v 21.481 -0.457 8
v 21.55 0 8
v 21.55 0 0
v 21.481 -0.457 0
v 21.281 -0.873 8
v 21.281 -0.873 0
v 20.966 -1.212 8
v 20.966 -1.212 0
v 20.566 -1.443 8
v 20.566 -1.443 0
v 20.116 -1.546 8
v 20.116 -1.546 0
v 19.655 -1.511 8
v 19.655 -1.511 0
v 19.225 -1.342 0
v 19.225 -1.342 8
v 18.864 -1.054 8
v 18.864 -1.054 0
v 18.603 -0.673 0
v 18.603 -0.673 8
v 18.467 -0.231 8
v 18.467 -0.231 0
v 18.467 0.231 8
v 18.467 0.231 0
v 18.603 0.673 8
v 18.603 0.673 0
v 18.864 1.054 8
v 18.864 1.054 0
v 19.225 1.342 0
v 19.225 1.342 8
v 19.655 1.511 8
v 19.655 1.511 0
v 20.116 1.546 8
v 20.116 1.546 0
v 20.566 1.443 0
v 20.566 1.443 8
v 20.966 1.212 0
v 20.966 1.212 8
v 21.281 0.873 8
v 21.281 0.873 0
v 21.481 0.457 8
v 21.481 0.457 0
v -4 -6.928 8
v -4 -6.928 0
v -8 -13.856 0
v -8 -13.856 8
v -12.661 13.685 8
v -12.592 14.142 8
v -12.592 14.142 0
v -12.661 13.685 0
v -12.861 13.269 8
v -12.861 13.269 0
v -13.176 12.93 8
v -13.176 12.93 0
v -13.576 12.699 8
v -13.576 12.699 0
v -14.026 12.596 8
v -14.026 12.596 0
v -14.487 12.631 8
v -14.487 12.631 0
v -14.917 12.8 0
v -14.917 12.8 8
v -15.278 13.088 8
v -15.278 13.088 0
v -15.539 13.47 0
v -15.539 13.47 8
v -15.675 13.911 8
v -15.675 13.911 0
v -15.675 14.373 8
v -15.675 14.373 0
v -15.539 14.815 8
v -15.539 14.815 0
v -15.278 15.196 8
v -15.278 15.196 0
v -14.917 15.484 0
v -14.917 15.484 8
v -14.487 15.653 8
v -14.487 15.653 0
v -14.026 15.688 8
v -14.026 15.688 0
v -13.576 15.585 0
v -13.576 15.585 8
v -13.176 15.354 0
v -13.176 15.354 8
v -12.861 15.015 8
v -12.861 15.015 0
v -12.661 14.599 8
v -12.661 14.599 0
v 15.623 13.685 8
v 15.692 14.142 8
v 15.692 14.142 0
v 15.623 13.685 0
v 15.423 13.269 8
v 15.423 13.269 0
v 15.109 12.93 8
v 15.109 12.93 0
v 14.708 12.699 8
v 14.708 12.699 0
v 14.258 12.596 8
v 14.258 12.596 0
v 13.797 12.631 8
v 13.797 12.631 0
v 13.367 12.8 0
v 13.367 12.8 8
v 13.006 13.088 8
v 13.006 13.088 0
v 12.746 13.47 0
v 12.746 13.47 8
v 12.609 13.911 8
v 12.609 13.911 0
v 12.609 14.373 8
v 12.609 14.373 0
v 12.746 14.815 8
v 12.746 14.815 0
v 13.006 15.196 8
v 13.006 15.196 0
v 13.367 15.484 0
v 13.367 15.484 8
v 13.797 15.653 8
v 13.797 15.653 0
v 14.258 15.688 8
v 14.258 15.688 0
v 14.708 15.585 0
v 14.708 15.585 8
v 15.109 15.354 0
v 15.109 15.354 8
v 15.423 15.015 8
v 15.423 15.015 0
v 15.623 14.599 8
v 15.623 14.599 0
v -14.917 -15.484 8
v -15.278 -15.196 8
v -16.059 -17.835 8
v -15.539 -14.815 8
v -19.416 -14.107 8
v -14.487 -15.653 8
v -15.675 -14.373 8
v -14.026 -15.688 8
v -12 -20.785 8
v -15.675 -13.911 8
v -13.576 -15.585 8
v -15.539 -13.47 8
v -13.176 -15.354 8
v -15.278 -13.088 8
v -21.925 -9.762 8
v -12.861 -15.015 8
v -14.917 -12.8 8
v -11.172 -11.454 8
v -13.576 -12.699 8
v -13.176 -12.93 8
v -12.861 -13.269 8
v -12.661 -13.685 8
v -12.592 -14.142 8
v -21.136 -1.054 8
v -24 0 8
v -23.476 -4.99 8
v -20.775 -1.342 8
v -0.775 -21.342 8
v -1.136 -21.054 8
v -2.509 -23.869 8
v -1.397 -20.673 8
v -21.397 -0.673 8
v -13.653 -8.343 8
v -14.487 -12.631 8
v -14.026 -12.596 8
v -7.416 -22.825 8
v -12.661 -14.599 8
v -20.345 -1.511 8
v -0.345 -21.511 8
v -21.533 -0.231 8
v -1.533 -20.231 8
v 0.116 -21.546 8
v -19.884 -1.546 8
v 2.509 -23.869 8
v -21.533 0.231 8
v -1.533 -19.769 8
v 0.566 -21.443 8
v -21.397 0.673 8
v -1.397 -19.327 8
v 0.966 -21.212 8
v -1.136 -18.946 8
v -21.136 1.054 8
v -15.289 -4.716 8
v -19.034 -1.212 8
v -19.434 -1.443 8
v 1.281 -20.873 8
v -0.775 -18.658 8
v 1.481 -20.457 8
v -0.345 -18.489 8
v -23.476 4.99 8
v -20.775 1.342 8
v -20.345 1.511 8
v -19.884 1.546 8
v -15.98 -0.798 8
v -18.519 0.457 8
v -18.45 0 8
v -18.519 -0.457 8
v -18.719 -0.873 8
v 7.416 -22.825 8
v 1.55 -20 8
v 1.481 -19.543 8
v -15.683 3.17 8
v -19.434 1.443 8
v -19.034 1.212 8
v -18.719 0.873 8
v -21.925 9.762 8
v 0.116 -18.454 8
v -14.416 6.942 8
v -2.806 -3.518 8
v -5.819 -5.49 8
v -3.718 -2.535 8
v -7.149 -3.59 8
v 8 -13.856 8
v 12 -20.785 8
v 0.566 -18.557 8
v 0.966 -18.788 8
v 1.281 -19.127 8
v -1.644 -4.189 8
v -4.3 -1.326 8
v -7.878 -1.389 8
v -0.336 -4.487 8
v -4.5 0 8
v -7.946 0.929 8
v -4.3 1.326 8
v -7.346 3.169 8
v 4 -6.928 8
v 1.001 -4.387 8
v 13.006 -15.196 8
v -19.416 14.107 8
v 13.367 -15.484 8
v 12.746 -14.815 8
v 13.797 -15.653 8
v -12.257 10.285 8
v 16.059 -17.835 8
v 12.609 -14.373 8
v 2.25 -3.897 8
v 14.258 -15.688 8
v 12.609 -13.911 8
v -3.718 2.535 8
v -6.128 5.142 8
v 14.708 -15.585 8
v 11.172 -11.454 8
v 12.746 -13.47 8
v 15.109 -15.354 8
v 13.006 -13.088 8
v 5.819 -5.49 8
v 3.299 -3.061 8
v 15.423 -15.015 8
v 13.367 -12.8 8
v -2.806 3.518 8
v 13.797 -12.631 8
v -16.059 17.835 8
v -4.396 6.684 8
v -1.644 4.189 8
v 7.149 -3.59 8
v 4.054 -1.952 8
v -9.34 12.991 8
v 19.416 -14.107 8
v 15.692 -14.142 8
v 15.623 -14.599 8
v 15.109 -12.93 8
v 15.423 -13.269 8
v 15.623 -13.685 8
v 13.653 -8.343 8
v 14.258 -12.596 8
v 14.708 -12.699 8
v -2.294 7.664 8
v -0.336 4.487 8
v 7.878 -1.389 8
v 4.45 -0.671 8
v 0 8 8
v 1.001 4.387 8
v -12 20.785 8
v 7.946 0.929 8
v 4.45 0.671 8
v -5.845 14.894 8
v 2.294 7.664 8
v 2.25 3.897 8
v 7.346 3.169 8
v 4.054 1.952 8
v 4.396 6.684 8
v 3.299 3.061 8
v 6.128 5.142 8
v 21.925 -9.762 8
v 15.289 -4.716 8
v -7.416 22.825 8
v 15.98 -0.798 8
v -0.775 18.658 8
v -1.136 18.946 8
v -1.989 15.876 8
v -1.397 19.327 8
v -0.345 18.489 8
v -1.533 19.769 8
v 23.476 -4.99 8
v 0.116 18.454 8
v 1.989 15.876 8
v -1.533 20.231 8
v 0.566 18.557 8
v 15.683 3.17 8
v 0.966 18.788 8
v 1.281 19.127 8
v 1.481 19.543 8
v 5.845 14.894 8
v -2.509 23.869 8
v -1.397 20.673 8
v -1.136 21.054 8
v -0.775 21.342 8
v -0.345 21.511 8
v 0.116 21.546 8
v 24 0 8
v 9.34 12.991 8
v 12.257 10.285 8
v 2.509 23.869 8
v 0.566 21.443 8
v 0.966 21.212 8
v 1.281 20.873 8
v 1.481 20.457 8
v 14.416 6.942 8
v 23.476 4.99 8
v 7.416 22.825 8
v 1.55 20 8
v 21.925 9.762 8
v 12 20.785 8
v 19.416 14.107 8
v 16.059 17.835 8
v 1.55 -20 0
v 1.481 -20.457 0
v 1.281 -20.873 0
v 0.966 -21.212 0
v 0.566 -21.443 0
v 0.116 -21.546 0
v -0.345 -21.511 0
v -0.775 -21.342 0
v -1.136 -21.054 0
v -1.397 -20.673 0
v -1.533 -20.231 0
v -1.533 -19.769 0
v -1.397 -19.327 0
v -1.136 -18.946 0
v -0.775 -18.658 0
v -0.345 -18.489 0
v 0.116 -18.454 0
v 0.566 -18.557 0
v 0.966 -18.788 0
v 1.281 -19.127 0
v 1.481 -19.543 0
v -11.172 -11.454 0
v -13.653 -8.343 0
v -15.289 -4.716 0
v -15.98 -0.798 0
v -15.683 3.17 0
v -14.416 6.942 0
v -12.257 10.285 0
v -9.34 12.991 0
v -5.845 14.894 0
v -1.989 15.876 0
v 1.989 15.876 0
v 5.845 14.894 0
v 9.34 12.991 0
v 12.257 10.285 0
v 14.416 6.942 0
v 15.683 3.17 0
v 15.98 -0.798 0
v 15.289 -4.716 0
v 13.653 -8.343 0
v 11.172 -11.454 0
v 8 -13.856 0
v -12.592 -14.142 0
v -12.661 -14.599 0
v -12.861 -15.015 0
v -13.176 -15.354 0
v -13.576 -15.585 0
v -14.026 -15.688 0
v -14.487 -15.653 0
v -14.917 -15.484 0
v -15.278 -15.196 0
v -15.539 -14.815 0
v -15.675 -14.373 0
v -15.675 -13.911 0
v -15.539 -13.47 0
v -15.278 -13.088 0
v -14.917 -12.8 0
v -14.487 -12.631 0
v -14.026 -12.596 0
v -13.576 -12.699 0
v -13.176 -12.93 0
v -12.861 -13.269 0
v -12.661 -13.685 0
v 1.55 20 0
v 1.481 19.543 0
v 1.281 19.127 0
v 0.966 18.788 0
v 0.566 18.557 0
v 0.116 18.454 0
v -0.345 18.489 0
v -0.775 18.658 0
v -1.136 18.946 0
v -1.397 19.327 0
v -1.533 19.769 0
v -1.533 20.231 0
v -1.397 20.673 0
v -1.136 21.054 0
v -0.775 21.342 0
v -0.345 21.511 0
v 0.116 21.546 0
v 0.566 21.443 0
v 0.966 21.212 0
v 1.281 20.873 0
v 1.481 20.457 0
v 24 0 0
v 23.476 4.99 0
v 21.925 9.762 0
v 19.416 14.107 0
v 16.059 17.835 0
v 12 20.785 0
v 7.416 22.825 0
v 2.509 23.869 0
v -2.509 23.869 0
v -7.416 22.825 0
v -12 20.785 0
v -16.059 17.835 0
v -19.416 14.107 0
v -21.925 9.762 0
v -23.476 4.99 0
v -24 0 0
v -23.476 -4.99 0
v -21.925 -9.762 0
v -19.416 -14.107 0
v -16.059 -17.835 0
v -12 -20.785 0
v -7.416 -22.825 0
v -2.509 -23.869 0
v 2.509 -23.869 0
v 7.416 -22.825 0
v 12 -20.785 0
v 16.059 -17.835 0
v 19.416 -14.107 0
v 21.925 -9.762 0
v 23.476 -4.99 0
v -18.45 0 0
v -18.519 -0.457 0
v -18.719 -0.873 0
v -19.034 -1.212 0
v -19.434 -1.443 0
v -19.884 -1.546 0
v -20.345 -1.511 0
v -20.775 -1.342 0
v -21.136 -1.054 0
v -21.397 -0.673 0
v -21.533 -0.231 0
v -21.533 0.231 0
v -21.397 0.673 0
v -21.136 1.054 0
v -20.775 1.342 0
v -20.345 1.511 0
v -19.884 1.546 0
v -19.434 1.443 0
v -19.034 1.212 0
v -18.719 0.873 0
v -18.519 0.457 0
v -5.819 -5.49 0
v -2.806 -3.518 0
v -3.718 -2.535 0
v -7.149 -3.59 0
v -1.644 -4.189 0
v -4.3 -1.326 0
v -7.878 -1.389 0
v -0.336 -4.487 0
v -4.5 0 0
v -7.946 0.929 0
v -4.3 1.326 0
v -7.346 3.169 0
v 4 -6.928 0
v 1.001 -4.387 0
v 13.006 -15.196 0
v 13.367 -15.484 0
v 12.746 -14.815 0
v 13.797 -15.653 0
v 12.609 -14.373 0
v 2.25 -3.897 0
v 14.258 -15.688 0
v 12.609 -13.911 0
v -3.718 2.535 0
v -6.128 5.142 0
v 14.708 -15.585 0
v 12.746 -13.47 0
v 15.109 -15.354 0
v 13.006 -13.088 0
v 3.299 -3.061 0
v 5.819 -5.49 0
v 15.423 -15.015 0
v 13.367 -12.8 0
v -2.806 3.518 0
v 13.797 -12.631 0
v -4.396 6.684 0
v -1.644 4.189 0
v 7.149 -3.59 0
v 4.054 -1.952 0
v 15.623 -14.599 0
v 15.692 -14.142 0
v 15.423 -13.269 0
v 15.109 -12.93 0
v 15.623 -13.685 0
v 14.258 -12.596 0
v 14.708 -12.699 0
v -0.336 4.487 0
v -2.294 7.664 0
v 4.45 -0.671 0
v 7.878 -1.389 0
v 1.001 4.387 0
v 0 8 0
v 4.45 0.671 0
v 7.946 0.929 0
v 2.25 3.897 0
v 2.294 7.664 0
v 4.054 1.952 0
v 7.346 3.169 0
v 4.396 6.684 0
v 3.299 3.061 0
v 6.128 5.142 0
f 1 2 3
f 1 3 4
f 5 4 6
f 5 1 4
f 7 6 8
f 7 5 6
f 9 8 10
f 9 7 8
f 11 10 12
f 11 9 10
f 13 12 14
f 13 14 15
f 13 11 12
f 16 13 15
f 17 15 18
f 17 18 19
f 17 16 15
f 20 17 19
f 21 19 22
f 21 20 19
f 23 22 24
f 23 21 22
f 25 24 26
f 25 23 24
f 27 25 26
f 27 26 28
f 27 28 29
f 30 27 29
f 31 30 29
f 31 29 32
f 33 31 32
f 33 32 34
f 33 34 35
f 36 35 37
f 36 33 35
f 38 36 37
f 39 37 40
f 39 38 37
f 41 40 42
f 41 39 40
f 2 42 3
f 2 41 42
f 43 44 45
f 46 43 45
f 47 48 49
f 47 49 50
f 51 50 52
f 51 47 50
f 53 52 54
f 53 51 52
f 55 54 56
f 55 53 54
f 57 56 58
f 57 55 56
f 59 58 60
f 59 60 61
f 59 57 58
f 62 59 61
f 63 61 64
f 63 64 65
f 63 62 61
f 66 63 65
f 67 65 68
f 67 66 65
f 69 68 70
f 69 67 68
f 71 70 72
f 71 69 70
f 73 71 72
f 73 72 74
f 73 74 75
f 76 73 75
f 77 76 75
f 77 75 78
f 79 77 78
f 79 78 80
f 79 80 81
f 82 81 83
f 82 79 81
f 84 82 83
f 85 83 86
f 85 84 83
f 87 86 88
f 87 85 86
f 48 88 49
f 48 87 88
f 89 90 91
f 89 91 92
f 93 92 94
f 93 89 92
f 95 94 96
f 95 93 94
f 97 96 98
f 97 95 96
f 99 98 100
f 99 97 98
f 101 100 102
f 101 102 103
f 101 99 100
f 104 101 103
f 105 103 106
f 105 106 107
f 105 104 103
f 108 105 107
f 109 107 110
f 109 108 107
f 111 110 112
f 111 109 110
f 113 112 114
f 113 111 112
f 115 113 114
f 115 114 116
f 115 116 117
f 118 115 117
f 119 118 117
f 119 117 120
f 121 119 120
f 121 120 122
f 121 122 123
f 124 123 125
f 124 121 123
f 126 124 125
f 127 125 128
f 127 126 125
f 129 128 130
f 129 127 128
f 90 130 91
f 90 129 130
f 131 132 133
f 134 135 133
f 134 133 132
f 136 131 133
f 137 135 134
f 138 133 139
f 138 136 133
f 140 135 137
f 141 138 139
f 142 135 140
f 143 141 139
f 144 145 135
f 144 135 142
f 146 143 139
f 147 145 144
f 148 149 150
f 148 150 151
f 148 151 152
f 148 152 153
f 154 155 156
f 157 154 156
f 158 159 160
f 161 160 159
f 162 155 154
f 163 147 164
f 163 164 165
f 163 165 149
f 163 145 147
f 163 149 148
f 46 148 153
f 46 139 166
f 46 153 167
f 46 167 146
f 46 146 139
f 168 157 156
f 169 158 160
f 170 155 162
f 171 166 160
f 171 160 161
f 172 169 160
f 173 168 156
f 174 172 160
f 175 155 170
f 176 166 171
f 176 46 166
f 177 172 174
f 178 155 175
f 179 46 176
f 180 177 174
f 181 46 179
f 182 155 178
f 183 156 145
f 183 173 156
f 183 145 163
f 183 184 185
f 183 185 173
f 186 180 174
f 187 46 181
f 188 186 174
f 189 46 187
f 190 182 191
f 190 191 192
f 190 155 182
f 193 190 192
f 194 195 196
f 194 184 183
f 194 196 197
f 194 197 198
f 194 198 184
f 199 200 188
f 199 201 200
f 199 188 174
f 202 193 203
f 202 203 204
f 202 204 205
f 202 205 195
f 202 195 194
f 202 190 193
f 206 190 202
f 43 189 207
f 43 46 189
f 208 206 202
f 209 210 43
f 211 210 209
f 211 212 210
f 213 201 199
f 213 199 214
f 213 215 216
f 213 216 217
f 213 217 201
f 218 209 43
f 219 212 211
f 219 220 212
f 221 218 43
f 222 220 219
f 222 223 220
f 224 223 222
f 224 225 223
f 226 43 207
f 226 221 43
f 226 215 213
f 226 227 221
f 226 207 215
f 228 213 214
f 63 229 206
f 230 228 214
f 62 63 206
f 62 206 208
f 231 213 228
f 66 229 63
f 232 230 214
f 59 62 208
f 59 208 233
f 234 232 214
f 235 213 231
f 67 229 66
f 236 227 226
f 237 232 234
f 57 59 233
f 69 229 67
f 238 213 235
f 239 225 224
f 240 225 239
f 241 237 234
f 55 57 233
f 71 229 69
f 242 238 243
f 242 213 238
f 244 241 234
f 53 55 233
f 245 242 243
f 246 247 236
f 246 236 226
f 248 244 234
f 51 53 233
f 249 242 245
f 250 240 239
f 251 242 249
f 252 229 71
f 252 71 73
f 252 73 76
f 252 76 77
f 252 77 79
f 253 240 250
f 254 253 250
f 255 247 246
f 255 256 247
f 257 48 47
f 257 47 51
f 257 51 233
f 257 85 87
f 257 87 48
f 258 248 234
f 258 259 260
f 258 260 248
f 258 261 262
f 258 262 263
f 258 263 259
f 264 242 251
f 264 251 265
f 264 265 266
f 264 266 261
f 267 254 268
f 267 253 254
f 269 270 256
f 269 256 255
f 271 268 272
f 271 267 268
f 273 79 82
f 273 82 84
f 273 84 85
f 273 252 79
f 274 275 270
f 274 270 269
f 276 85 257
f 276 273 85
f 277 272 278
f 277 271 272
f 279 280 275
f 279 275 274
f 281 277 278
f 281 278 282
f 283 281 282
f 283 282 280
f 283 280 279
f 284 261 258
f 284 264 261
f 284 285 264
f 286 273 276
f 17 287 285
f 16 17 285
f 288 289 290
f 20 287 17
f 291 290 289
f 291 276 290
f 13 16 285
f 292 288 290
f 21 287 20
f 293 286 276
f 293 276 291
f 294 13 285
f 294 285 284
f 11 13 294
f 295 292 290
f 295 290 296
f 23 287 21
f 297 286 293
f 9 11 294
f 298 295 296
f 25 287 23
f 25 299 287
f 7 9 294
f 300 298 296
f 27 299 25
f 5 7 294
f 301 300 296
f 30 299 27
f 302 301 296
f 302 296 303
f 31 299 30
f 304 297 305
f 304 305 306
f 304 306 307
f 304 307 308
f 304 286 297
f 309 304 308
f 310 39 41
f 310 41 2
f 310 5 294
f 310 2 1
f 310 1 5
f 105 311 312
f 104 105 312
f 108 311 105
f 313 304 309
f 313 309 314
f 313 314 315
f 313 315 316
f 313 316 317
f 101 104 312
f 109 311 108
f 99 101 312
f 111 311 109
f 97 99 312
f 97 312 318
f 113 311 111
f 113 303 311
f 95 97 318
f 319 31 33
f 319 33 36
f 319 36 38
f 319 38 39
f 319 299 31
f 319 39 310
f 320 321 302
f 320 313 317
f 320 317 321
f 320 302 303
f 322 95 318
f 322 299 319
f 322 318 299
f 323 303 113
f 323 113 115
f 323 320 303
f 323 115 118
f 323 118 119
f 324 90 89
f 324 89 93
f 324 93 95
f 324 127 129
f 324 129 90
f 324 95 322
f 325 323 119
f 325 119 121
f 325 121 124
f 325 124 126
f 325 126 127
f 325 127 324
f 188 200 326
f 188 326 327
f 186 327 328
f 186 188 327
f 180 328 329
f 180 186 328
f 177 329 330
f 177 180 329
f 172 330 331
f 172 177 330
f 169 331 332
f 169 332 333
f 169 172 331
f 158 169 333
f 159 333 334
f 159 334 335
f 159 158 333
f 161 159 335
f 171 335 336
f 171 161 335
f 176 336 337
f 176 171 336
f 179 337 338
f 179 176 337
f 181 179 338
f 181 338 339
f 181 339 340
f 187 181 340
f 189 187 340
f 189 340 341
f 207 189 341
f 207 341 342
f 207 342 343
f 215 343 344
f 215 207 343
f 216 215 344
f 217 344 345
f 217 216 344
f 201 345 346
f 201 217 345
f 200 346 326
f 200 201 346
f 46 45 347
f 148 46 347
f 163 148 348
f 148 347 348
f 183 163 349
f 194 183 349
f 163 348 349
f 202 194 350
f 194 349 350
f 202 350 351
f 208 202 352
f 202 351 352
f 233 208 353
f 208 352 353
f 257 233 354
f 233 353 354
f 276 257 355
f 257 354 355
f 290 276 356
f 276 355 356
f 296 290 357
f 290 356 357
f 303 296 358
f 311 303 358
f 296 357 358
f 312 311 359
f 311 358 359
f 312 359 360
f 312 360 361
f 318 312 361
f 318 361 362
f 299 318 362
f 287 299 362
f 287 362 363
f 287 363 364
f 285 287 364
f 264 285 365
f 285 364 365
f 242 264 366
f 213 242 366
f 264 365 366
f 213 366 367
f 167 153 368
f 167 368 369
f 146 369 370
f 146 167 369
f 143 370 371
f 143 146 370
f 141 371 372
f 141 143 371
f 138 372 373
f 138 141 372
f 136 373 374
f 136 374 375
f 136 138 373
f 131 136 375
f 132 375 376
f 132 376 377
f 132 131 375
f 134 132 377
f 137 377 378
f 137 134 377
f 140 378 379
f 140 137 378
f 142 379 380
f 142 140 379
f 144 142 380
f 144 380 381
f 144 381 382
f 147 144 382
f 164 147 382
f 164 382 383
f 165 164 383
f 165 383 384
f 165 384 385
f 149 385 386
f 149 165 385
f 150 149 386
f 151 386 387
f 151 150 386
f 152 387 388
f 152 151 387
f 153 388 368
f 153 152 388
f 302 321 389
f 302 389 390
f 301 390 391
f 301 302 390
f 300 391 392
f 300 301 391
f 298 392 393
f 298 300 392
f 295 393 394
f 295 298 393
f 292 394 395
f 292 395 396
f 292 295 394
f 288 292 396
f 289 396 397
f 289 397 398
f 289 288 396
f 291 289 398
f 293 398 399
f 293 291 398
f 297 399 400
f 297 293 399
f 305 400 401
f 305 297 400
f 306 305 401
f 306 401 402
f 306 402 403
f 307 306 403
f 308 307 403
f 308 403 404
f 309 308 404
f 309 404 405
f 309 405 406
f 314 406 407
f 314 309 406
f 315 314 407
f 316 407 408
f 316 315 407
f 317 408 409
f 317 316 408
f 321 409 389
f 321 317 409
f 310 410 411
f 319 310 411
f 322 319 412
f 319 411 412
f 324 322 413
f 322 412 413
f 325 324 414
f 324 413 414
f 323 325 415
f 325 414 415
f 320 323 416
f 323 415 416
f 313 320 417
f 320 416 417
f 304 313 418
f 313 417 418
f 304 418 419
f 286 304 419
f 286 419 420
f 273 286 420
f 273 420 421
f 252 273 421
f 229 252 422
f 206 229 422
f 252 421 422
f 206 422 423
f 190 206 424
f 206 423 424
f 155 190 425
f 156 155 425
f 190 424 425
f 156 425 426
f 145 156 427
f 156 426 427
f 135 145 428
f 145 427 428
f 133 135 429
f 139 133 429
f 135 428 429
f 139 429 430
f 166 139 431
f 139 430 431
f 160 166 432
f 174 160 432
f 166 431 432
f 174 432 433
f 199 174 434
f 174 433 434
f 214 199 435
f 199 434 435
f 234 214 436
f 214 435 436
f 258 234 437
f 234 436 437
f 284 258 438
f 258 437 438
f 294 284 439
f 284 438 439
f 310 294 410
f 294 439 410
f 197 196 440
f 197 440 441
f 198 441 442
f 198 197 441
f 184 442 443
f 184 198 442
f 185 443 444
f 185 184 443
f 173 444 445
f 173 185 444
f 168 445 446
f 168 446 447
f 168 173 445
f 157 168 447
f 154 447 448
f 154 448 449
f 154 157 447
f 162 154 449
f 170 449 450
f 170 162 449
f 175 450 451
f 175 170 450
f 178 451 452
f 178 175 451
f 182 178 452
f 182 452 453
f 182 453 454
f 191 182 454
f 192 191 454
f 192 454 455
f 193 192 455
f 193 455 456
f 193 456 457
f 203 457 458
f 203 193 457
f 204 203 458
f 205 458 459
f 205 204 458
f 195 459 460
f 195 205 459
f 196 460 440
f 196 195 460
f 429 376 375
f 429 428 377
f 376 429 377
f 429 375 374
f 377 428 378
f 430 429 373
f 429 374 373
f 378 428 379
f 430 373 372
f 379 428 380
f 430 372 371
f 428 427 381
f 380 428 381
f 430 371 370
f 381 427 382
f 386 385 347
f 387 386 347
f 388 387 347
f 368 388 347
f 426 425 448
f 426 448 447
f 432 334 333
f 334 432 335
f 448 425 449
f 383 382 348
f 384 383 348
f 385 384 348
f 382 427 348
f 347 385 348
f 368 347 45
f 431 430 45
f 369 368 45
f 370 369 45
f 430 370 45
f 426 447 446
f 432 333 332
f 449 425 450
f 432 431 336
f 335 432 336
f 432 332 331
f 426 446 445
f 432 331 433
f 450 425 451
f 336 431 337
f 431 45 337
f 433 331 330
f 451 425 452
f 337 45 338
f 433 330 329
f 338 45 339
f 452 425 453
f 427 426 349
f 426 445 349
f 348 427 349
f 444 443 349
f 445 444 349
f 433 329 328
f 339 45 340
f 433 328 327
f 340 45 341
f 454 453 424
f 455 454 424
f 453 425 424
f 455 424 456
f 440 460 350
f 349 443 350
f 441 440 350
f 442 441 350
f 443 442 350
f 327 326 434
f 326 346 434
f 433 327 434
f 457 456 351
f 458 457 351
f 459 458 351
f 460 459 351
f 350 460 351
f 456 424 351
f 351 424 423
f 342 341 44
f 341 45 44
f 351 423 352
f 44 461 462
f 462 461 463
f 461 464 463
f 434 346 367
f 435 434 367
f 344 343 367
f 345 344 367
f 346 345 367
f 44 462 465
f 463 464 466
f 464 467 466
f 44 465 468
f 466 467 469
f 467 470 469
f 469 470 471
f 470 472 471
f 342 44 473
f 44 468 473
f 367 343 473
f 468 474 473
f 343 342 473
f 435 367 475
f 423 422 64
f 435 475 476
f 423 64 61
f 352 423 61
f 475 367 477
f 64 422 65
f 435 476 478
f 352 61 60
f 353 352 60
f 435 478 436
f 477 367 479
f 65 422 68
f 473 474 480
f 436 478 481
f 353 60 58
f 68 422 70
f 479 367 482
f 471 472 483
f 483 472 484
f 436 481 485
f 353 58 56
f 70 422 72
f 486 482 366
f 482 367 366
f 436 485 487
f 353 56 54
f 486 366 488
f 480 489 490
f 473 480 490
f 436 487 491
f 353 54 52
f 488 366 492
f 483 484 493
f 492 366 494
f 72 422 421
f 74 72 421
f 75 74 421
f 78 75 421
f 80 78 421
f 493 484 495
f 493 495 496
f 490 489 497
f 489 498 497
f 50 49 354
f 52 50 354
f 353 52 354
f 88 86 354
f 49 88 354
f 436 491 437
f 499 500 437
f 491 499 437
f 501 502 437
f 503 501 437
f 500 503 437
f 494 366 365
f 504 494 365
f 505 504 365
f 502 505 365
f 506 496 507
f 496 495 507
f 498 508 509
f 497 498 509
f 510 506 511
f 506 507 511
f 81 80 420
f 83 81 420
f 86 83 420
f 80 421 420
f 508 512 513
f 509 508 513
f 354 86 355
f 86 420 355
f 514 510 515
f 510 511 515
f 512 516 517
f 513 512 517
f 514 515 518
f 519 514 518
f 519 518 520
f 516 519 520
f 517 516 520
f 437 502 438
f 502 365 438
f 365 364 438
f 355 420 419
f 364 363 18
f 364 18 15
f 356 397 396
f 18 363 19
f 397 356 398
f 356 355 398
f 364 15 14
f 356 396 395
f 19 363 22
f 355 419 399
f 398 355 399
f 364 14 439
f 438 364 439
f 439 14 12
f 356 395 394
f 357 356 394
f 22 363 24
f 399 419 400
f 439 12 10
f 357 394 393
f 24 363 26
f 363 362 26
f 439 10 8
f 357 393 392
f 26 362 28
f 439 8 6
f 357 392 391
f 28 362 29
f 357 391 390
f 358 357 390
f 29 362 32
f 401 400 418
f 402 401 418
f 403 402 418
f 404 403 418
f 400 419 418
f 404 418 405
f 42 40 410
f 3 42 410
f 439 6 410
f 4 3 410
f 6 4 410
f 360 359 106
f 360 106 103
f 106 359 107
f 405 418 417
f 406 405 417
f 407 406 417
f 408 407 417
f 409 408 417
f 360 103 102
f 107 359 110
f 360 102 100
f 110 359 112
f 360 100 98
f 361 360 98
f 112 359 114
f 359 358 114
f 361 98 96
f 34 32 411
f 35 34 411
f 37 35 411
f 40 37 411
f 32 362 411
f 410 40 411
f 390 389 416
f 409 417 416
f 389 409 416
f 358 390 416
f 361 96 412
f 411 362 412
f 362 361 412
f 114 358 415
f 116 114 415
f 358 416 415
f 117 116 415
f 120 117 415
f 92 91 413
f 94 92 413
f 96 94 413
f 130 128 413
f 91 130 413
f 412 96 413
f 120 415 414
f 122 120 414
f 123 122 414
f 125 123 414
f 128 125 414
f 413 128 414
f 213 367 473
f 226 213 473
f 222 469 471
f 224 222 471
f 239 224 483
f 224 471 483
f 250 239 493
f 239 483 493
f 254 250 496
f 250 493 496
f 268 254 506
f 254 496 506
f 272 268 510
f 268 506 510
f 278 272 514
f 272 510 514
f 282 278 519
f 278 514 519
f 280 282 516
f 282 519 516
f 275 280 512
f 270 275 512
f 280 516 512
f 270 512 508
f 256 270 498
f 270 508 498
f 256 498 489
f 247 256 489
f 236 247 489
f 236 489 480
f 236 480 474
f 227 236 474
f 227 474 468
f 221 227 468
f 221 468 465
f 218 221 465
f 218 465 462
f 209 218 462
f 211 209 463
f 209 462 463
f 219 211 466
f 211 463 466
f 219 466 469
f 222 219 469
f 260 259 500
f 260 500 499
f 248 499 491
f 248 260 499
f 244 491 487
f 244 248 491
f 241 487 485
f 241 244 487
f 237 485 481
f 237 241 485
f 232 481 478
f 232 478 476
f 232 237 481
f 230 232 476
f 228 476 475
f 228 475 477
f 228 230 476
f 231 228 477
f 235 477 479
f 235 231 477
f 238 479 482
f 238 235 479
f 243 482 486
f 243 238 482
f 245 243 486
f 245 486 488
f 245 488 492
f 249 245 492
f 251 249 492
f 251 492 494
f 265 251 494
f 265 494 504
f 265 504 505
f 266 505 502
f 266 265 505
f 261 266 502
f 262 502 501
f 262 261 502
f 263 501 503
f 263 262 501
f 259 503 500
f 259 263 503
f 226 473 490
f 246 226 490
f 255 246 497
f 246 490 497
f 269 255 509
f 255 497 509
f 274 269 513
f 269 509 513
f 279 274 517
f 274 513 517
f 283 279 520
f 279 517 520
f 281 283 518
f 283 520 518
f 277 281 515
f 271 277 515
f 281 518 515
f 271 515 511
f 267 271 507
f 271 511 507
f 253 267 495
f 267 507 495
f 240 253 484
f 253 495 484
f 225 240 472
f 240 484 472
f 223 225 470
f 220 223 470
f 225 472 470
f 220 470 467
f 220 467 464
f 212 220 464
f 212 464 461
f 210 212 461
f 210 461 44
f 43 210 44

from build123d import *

# Parameters (mm, degrees)
SKETCH6_R           = 24
BOSS_EXTRUDE1_DEPTH = 8
CUT_EXTRUDE4_DEPTH  = 8
SKETCH7_R           = 4.5
CUT_EXTRUDE5_DEPTH  = 8
SKETCH8_R           = 1.55
CUT_EXTRUDE6_DEPTH  = 8


with BuildPart() as part:
    # Sketch6 → Boss-Extrude1 (new body)
    with BuildSketch(Plane.XY):
        Circle(SKETCH6_R)
    extrude(amount=BOSS_EXTRUDE1_DEPTH)

    # Sketch4 → Cut-Extrude4 (cut)
    with BuildSketch(Plane.XY):
        with BuildLine():
            Line((-4, -6.92820323), (-8, -13.856406461))
            ThreePointArc((-8, -13.856406461), (0, 16), (8, -13.856406461))
            Line((8, -13.856406461), (4, -6.92820323))
            ThreePointArc((4, -6.92820323), (0, 8), (-4, -6.92820323))
        make_face()
    extrude(amount=CUT_EXTRUDE4_DEPTH, mode=Mode.SUBTRACT)

    # Sketch7 → Cut-Extrude5 (cut)
    with BuildSketch(Plane(origin=(0, 0, 0), x_dir=(-1, 0, 0), z_dir=(0, 0, -1))):
        Circle(SKETCH7_R)
    extrude(amount=-CUT_EXTRUDE5_DEPTH, mode=Mode.SUBTRACT)

    # Sketch8 → Cut-Extrude6 (cut)
    with BuildSketch(Plane(origin=(0, 0, 8), x_dir=(-1, 0, 0), z_dir=(0, 0, -1))):
        with Locations(Location((0, 20, 0), (0, 0, 180))):
            Circle(SKETCH8_R)
        with Locations(Location((14.142135624, 14.142135624, 0), (0, 0, 180))):
            Circle(SKETCH8_R)
        with Locations(Location((20, 0, 0), (0, 0, 180))):
            Circle(SKETCH8_R)
        with Locations(Location((14.142135624, -14.142135624, 0), (0, 0, 180))):
            Circle(SKETCH8_R)
        with Locations(Location((0, -20, 0), (0, 0, 180))):
            Circle(SKETCH8_R)
        with Locations(Location((-14.142135624, -14.142135624, 0), (0, 0, 180))):
            Circle(SKETCH8_R)
        with Locations(Location((-20, 0, 0), (0, 0, 180))):
            Circle(SKETCH8_R)
        with Locations(Location((-14.142135624, 14.142135624, 0), (0, 0, 180))):
            Circle(SKETCH8_R)
    extrude(amount=CUT_EXTRUDE6_DEPTH, mode=Mode.SUBTRACT)


solid = part.part
